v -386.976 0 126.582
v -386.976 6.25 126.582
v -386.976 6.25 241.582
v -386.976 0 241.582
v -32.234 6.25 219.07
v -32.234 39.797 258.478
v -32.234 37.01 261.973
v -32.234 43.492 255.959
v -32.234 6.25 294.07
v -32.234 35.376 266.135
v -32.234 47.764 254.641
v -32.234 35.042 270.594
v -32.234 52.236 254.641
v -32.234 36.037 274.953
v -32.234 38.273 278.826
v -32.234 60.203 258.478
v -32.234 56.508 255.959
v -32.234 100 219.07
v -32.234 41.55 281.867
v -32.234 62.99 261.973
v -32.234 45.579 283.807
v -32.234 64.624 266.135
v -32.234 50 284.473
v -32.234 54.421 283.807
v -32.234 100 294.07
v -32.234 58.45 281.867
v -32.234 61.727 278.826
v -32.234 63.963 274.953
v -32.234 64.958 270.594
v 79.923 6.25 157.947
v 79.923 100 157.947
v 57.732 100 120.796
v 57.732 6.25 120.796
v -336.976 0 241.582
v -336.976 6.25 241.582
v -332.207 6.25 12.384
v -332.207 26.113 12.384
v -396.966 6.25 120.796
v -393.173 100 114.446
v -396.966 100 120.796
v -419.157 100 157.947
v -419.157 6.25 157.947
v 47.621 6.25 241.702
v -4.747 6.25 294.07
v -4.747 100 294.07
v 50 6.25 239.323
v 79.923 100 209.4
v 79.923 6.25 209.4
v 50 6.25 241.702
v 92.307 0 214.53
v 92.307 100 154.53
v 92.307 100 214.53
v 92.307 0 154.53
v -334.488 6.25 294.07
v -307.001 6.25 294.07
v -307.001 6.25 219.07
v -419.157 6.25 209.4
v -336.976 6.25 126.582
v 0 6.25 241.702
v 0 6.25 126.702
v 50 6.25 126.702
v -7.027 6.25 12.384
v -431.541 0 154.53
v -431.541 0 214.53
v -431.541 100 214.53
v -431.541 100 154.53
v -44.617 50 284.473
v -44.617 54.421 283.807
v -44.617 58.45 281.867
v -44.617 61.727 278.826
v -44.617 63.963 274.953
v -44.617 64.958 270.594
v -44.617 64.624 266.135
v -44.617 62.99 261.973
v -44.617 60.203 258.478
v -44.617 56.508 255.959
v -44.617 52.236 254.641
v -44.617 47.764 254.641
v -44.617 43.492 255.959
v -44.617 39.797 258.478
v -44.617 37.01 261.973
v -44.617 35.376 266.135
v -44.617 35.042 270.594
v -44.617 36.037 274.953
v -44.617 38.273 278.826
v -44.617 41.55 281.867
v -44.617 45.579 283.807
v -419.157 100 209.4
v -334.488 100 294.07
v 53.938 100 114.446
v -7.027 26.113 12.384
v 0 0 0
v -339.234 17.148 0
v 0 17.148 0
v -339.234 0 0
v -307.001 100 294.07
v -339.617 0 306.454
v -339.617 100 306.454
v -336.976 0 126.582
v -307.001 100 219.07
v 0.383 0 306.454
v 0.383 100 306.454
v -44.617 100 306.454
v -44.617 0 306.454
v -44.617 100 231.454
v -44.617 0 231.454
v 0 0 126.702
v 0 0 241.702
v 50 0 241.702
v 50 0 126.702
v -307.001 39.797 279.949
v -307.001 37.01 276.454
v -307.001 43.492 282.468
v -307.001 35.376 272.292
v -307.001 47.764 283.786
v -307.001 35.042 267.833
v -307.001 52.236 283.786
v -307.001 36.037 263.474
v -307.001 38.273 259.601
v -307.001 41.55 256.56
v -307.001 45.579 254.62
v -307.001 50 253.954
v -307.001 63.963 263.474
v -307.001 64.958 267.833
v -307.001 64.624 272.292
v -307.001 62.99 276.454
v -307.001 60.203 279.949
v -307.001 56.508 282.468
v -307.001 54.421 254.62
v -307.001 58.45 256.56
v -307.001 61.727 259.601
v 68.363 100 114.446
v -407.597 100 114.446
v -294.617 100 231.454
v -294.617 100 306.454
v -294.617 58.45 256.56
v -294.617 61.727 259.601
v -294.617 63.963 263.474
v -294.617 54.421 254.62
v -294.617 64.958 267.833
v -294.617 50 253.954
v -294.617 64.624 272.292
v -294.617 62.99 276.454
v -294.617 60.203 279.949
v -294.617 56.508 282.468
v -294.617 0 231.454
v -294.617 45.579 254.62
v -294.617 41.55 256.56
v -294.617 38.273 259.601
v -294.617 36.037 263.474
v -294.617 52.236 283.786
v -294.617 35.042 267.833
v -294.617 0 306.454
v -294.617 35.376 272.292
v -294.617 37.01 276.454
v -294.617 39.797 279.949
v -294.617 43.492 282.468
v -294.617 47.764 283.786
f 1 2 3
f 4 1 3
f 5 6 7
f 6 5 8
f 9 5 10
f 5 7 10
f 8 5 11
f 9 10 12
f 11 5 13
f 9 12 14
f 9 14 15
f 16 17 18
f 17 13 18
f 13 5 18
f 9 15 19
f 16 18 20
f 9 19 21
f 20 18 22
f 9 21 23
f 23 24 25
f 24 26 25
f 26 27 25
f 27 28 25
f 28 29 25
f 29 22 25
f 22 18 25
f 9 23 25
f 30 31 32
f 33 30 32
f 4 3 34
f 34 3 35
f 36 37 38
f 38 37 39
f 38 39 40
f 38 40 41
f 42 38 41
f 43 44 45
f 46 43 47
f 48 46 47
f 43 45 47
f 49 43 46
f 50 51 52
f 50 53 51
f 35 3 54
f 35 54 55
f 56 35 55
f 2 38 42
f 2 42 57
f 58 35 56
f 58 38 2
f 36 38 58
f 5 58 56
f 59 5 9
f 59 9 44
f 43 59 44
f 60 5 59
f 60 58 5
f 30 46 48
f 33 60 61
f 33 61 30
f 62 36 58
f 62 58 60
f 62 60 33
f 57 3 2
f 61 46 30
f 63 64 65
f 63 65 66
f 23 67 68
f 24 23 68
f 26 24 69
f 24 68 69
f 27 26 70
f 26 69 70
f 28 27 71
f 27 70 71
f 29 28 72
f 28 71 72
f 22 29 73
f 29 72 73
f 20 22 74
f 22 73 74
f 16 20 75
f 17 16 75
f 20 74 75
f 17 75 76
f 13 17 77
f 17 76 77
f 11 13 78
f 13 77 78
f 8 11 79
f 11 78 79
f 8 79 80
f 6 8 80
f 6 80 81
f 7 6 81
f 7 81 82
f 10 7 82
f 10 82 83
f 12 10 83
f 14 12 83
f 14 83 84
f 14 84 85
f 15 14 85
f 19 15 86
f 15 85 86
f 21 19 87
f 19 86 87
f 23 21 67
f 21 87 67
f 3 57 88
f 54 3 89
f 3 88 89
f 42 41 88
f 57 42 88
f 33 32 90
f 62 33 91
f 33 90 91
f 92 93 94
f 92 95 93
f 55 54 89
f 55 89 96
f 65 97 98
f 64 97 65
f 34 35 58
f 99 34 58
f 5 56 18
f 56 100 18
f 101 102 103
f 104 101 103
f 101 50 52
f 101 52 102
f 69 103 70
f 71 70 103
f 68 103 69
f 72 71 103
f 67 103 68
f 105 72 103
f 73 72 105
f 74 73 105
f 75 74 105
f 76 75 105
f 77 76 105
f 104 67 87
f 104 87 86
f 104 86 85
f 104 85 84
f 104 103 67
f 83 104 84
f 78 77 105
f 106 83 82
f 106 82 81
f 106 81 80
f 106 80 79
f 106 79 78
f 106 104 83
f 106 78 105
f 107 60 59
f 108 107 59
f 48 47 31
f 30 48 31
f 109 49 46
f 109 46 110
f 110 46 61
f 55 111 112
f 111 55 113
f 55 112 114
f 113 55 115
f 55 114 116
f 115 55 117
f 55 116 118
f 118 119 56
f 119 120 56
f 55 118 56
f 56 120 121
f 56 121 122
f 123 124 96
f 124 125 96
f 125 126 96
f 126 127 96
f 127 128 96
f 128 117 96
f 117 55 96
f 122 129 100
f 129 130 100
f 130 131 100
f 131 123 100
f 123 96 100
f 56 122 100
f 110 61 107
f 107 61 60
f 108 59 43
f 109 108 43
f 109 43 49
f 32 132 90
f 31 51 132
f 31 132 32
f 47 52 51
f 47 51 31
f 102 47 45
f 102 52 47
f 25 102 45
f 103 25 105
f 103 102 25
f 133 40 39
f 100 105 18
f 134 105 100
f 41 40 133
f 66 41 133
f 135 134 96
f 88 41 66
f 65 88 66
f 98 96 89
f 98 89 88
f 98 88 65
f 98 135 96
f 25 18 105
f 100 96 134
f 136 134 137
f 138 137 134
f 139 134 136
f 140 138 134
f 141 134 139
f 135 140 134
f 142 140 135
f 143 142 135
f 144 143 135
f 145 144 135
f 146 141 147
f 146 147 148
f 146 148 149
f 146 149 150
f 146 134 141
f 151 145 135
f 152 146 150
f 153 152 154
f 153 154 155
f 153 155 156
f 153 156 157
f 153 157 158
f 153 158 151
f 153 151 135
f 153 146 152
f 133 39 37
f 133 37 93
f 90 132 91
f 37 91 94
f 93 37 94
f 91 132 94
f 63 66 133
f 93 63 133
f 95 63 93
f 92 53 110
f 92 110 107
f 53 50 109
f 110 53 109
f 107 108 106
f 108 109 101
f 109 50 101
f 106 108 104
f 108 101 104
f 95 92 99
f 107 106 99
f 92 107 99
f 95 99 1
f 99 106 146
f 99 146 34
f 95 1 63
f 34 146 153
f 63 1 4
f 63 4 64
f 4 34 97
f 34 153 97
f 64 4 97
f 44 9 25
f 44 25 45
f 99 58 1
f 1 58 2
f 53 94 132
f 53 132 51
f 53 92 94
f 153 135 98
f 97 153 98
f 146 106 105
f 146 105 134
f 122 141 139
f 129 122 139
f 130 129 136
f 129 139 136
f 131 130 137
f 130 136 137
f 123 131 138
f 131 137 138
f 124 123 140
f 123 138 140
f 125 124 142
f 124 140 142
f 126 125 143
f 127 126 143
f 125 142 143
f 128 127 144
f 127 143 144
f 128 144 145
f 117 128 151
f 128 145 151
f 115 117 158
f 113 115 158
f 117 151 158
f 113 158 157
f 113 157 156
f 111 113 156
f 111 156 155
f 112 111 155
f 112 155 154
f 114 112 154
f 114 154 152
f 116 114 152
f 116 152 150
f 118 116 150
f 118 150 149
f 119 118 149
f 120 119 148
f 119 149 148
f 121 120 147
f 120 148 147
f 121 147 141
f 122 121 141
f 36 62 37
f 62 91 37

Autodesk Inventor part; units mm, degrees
ref_plane "YZ Plane" through (0, 0, 0) normal (1, 0, 0) x (0, 1, 0)
ref_plane "XZ Plane" through (0, 0, 0) normal (0, 1, 0) x (-1, 0, 0)
ref_plane "XY Plane" through (0, 0, 0) normal (0, 0, 1) x (1, 0, 0)
sketch "Эскиз1" plane through (0, 0, 0) normal (0, 1, 0) x (-1, 0, 0)
  line L0 (0, 0) -> (-92.3067, 154.5298)
  line L1 (-92.3067, 154.5298) -> (-92.3067, 214.5298)
  line L2 (-92.3067, 214.5298) -> (-0.3828, 306.4537)
  line L3 (-0.3828, 306.4537) -> (44.6172, 306.4537)
  line L4 (44.6172, 306.4537) -> (44.6172, 231.4537)
  line L5 (44.6172, 231.4537) -> (294.6172, 231.4537)
  line L6 (294.6172, 231.4537) -> (294.6172, 306.4537)
  line L7 (294.6172, 306.4537) -> (339.6172, 306.4537)
  line L8 (339.6172, 306.4537) -> (431.5411, 214.5298)
  line L9 (431.5411, 214.5298) -> (431.5411, 154.5298)
  line L10 (431.5411, 154.5298) -> (339.2344, 0)
  line L11 (339.2344, 0) -> (-0.7656, 0)
  point P0 (-92.3067, 184.5298)
  point P1 (431.5411, 184.5298)
  point P2 (-46.1534, 77.2649)
  point P3 (385.3877, 77.2649)
  point P4 (-46.3448, 260.4918)
  point P5 (385.5791, 260.4918)
  point P6 (294.6172, 268.9537)
  point P7 (44.6172, 268.9537)
  dimension "d0" = 180
  dimension "d1" = 130
  dimension "d2" = 45
  dimension "d3" = 75
  dimension "d4" = 60
  dimension "d5" = 180
  dimension "d6" = 250
  dimension "d7" = 340
extrude "Выдавливание1" add sketch "Эскиз1" along normal blind 100
sketch "Эскиз2" plane through (0, 100, 0) normal (0, 1, 0) x (1, 0, 0)
  point P0 (0, 0)
sketch "Эскиз3" plane through (92.3067, 0, 214.5298) normal (1, 0, 0) x (0, 0, -1)
  line L0 (33.7152, 148.0469) -> (238.2174, 0)
  line L1 (238.2174, 0) -> (332.909, 130.8007)
  line L2 (332.909, 130.8007) -> (135.9663, 223.0574)
  line L3 (135.9663, 223.0574) -> (33.7152, 148.0469)
  point P0 (214.5298, 0)
extrude "Выдавливание2" cut sketch "Эскиз3" against normal blind 600.5
sketch "Эскиз4" plane through (-407.5973, 100, 114.4458) normal (0, 0.81, -0.5864) x (1, 0, 0)
  line L0 (68.363, 141.2878) -> (407.5973, 141.2878) projected
  line L1 (407.5973, 141.2878) -> (475.9603, 0) projected
  line L2 (499.904, -32.4688) -> (475.9603, 0) projected
  line L3 (499.904, -81.0699) -> (499.904, -32.4688) projected
  line L4 (407.9801, -155.53) -> (499.904, -81.0699) projected
sketch "Эскиз5" plane through (0, 100, 0) normal (0, 1, 0) x (1, 0, 0)
  line L0 (-431.5411, -214.5298) -> (-339.6172, -306.4537) projected
  line L1 (-339.6172, -306.4537) -> (-294.6172, -306.4537) projected
  line L2 (-431.5411, -154.5298) -> (-431.5411, -214.5298) projected
  line L3 (-407.5973, -114.4458) -> (-431.5411, -154.5298) projected
  line L4 (-407.5973, -114.4458) -> (-339.2344, 0) projected
  line L5 (-339.2344, 0) -> (0, 0) projected
  line L6 (0, 0) -> (68.363, -114.4458) projected
  line L7 (92.3067, -154.5298) -> (68.363, -114.4458) projected
  line L8 (92.3067, -214.5298) -> (92.3067, -154.5298) projected
  line L9 (0.3828, -306.4537) -> (92.3067, -214.5298) projected
  line L10 (-44.6172, -306.4537) -> (0.3828, -306.4537) projected
  line L11 (-44.6172, -231.4537) -> (-44.6172, -306.4537) projected
  line L12 (-294.6172, -231.4537) -> (-44.6172, -231.4537) projected
  line L13 (-294.6172, -306.4537) -> (-294.6172, -231.4537) projected
  line L14 (0, -12.3836) -> (-332.2068, -12.3836)
  line L15 (-332.2068, -12.3836) -> (-396.966, -120.7964)
  line L16 (-396.966, -120.7964) -> (-419.1574, -157.9469)
  line L17 (-419.1574, -157.9469) -> (-419.1574, -209.4004)
  line L18 (-419.1574, -209.4004) -> (-334.4877, -294.0701)
  line L19 (-334.4877, -294.0701) -> (-307.0008, -294.0701)
  line L20 (-307.0008, -294.0701) -> (-307.0008, -219.0701)
  line L21 (-307.0008, -219.0701) -> (-32.2335, -219.0701)
  line L22 (-32.2335, -219.0701) -> (-32.2335, -294.0701)
  line L23 (-32.2335, -294.0701) -> (-4.7467, -294.0701)
  line L24 (-4.7467, -294.0701) -> (79.9231, -209.4004)
  line L25 (79.9231, -209.4004) -> (79.9231, -157.9469)
  line L26 (79.9231, -157.9469) -> (57.7316, -120.7964)
  line L27 (57.7316, -120.7964) -> (-10.6313, -6.3505)
  point P0 (-7.0275, -12.3836)
extrude "Выдавливание3" cut sketch "Эскиз5" against normal blind 93.75 contours L27 L26 L25 L24 L23 L22 L21 L20 L19 L18 L17 L16 L15 L14
sketch "Эскиз6" plane through (0, 6.25, 0) normal (0, 1, 0) x (1, 0, 0)
  line L0 (0, -241.7021) -> (50, -241.7021)
  line L1 (50, -241.7021) -> (50, -126.7021)
  line L2 (50, -126.7021) -> (0, -126.7021)
  line L3 (0, -126.7021) -> (0, -241.7021)
  line L4 (-334.4877, -294.0701) -> (-419.1574, -209.4004) projected
  line L5 (-386.9759, -241.5819) -> (-336.9759, -241.5819)
  line L6 (-336.9759, -241.5819) -> (-336.9759, -126.5819)
  line L7 (-336.9759, -126.5819) -> (-386.9759, -126.5819)
  line L8 (-386.9759, -126.5819) -> (-386.9759, -241.5819)
  point P0 (0, 0)
  point P1 (50, -184.2021)
  point P2 (0, -184.2021)
  point P3 (-336.9759, -184.0819)
  point P4 (-386.9759, -184.0819)
  point P5 (-361.9759, -241.5819)
  point P6 (-361.9759, -126.5819)
  point P7 (25, -241.7021)
  point P8 (25, -126.7021)
  dimension "d23" = 50
  dimension "d24" = 50
  dimension "d25" = 115
  dimension "d26" = 115
  dimension "d27" = 336.9759
extrude "Выдавливание4" cut sketch "Эскиз6" against normal blind 93.75
sketch "Эскиз7" plane through (-294.6172, 0, 306.4537) normal (1, 0, 0) x (0, 0, -1)
  line L0 (0, 100) -> (75, 100) projected
  line L1 (37.5, 100) -> (37.5, 0)
  line L2 (0, 0) -> (75, 0) projected
  line L3 (75, 0) -> (75, 100) projected
  line L4 (75, 50) -> (0, 50)
  line L5 (0, 0) -> (0, 100) projected
  circle A0 centre (37.5, 50) radius 15
  line L6 (-95.282, 50) -> (-21.0844, 50)
  line L7 (-58.1832, 95.9679) -> (-58.1832, 0)
  circle A1 centre (-58.1832, 47.9839) radius 15
  point P0 (306.4537, 0)
  dimension "d30" = 30
  dimension "d31" = 30
extrude "Выдавливание5" cut sketch "Эскиз7" against normal blind 20 contours A0 L4 L1 | L1 L4 A0 | L4 L1 A0 | L4 A0 L1 | A1 L7 L6 | L6 L7 A1 | L7 A1 L6 | L6 A1 L7
sketch "Эскиз8" plane through (-294.6172, 0, 231.4537) normal (0, 0, 1) x (1, 0, 0)
  point P0 (294.6172, 0)
sketch "Эскиз9" plane through (-44.6172, 0, 231.4537) normal (-1, 0, 0) x (0, 0, 1)
  line L0 (0, 0) -> (75, 0) projected
  line L1 (37.5, 0) -> (37.5, 100)
  line L2 (62.6164, 100) -> (-12.3836, 100) projected
  line L3 (75, 0) -> (75, 100) projected
  line L4 (75, 50) -> (1.0391, 50)
  line L5 (1.0391, 50) -> (0, 50)
  line L6 (0, 0) -> (0, 100) projected
  circle A0 centre (38.0196, 50) radius 15
  point P0 (-231.4537, 0)
  dimension "d34" = 30
extrude "Выдавливание6" cut sketch "Эскиз9" against normal blind 20 contours A0 L4 L1 | L1 L4 A0 | L4 A0 L1 | L1 A0 L4
properties part number "корпус"
